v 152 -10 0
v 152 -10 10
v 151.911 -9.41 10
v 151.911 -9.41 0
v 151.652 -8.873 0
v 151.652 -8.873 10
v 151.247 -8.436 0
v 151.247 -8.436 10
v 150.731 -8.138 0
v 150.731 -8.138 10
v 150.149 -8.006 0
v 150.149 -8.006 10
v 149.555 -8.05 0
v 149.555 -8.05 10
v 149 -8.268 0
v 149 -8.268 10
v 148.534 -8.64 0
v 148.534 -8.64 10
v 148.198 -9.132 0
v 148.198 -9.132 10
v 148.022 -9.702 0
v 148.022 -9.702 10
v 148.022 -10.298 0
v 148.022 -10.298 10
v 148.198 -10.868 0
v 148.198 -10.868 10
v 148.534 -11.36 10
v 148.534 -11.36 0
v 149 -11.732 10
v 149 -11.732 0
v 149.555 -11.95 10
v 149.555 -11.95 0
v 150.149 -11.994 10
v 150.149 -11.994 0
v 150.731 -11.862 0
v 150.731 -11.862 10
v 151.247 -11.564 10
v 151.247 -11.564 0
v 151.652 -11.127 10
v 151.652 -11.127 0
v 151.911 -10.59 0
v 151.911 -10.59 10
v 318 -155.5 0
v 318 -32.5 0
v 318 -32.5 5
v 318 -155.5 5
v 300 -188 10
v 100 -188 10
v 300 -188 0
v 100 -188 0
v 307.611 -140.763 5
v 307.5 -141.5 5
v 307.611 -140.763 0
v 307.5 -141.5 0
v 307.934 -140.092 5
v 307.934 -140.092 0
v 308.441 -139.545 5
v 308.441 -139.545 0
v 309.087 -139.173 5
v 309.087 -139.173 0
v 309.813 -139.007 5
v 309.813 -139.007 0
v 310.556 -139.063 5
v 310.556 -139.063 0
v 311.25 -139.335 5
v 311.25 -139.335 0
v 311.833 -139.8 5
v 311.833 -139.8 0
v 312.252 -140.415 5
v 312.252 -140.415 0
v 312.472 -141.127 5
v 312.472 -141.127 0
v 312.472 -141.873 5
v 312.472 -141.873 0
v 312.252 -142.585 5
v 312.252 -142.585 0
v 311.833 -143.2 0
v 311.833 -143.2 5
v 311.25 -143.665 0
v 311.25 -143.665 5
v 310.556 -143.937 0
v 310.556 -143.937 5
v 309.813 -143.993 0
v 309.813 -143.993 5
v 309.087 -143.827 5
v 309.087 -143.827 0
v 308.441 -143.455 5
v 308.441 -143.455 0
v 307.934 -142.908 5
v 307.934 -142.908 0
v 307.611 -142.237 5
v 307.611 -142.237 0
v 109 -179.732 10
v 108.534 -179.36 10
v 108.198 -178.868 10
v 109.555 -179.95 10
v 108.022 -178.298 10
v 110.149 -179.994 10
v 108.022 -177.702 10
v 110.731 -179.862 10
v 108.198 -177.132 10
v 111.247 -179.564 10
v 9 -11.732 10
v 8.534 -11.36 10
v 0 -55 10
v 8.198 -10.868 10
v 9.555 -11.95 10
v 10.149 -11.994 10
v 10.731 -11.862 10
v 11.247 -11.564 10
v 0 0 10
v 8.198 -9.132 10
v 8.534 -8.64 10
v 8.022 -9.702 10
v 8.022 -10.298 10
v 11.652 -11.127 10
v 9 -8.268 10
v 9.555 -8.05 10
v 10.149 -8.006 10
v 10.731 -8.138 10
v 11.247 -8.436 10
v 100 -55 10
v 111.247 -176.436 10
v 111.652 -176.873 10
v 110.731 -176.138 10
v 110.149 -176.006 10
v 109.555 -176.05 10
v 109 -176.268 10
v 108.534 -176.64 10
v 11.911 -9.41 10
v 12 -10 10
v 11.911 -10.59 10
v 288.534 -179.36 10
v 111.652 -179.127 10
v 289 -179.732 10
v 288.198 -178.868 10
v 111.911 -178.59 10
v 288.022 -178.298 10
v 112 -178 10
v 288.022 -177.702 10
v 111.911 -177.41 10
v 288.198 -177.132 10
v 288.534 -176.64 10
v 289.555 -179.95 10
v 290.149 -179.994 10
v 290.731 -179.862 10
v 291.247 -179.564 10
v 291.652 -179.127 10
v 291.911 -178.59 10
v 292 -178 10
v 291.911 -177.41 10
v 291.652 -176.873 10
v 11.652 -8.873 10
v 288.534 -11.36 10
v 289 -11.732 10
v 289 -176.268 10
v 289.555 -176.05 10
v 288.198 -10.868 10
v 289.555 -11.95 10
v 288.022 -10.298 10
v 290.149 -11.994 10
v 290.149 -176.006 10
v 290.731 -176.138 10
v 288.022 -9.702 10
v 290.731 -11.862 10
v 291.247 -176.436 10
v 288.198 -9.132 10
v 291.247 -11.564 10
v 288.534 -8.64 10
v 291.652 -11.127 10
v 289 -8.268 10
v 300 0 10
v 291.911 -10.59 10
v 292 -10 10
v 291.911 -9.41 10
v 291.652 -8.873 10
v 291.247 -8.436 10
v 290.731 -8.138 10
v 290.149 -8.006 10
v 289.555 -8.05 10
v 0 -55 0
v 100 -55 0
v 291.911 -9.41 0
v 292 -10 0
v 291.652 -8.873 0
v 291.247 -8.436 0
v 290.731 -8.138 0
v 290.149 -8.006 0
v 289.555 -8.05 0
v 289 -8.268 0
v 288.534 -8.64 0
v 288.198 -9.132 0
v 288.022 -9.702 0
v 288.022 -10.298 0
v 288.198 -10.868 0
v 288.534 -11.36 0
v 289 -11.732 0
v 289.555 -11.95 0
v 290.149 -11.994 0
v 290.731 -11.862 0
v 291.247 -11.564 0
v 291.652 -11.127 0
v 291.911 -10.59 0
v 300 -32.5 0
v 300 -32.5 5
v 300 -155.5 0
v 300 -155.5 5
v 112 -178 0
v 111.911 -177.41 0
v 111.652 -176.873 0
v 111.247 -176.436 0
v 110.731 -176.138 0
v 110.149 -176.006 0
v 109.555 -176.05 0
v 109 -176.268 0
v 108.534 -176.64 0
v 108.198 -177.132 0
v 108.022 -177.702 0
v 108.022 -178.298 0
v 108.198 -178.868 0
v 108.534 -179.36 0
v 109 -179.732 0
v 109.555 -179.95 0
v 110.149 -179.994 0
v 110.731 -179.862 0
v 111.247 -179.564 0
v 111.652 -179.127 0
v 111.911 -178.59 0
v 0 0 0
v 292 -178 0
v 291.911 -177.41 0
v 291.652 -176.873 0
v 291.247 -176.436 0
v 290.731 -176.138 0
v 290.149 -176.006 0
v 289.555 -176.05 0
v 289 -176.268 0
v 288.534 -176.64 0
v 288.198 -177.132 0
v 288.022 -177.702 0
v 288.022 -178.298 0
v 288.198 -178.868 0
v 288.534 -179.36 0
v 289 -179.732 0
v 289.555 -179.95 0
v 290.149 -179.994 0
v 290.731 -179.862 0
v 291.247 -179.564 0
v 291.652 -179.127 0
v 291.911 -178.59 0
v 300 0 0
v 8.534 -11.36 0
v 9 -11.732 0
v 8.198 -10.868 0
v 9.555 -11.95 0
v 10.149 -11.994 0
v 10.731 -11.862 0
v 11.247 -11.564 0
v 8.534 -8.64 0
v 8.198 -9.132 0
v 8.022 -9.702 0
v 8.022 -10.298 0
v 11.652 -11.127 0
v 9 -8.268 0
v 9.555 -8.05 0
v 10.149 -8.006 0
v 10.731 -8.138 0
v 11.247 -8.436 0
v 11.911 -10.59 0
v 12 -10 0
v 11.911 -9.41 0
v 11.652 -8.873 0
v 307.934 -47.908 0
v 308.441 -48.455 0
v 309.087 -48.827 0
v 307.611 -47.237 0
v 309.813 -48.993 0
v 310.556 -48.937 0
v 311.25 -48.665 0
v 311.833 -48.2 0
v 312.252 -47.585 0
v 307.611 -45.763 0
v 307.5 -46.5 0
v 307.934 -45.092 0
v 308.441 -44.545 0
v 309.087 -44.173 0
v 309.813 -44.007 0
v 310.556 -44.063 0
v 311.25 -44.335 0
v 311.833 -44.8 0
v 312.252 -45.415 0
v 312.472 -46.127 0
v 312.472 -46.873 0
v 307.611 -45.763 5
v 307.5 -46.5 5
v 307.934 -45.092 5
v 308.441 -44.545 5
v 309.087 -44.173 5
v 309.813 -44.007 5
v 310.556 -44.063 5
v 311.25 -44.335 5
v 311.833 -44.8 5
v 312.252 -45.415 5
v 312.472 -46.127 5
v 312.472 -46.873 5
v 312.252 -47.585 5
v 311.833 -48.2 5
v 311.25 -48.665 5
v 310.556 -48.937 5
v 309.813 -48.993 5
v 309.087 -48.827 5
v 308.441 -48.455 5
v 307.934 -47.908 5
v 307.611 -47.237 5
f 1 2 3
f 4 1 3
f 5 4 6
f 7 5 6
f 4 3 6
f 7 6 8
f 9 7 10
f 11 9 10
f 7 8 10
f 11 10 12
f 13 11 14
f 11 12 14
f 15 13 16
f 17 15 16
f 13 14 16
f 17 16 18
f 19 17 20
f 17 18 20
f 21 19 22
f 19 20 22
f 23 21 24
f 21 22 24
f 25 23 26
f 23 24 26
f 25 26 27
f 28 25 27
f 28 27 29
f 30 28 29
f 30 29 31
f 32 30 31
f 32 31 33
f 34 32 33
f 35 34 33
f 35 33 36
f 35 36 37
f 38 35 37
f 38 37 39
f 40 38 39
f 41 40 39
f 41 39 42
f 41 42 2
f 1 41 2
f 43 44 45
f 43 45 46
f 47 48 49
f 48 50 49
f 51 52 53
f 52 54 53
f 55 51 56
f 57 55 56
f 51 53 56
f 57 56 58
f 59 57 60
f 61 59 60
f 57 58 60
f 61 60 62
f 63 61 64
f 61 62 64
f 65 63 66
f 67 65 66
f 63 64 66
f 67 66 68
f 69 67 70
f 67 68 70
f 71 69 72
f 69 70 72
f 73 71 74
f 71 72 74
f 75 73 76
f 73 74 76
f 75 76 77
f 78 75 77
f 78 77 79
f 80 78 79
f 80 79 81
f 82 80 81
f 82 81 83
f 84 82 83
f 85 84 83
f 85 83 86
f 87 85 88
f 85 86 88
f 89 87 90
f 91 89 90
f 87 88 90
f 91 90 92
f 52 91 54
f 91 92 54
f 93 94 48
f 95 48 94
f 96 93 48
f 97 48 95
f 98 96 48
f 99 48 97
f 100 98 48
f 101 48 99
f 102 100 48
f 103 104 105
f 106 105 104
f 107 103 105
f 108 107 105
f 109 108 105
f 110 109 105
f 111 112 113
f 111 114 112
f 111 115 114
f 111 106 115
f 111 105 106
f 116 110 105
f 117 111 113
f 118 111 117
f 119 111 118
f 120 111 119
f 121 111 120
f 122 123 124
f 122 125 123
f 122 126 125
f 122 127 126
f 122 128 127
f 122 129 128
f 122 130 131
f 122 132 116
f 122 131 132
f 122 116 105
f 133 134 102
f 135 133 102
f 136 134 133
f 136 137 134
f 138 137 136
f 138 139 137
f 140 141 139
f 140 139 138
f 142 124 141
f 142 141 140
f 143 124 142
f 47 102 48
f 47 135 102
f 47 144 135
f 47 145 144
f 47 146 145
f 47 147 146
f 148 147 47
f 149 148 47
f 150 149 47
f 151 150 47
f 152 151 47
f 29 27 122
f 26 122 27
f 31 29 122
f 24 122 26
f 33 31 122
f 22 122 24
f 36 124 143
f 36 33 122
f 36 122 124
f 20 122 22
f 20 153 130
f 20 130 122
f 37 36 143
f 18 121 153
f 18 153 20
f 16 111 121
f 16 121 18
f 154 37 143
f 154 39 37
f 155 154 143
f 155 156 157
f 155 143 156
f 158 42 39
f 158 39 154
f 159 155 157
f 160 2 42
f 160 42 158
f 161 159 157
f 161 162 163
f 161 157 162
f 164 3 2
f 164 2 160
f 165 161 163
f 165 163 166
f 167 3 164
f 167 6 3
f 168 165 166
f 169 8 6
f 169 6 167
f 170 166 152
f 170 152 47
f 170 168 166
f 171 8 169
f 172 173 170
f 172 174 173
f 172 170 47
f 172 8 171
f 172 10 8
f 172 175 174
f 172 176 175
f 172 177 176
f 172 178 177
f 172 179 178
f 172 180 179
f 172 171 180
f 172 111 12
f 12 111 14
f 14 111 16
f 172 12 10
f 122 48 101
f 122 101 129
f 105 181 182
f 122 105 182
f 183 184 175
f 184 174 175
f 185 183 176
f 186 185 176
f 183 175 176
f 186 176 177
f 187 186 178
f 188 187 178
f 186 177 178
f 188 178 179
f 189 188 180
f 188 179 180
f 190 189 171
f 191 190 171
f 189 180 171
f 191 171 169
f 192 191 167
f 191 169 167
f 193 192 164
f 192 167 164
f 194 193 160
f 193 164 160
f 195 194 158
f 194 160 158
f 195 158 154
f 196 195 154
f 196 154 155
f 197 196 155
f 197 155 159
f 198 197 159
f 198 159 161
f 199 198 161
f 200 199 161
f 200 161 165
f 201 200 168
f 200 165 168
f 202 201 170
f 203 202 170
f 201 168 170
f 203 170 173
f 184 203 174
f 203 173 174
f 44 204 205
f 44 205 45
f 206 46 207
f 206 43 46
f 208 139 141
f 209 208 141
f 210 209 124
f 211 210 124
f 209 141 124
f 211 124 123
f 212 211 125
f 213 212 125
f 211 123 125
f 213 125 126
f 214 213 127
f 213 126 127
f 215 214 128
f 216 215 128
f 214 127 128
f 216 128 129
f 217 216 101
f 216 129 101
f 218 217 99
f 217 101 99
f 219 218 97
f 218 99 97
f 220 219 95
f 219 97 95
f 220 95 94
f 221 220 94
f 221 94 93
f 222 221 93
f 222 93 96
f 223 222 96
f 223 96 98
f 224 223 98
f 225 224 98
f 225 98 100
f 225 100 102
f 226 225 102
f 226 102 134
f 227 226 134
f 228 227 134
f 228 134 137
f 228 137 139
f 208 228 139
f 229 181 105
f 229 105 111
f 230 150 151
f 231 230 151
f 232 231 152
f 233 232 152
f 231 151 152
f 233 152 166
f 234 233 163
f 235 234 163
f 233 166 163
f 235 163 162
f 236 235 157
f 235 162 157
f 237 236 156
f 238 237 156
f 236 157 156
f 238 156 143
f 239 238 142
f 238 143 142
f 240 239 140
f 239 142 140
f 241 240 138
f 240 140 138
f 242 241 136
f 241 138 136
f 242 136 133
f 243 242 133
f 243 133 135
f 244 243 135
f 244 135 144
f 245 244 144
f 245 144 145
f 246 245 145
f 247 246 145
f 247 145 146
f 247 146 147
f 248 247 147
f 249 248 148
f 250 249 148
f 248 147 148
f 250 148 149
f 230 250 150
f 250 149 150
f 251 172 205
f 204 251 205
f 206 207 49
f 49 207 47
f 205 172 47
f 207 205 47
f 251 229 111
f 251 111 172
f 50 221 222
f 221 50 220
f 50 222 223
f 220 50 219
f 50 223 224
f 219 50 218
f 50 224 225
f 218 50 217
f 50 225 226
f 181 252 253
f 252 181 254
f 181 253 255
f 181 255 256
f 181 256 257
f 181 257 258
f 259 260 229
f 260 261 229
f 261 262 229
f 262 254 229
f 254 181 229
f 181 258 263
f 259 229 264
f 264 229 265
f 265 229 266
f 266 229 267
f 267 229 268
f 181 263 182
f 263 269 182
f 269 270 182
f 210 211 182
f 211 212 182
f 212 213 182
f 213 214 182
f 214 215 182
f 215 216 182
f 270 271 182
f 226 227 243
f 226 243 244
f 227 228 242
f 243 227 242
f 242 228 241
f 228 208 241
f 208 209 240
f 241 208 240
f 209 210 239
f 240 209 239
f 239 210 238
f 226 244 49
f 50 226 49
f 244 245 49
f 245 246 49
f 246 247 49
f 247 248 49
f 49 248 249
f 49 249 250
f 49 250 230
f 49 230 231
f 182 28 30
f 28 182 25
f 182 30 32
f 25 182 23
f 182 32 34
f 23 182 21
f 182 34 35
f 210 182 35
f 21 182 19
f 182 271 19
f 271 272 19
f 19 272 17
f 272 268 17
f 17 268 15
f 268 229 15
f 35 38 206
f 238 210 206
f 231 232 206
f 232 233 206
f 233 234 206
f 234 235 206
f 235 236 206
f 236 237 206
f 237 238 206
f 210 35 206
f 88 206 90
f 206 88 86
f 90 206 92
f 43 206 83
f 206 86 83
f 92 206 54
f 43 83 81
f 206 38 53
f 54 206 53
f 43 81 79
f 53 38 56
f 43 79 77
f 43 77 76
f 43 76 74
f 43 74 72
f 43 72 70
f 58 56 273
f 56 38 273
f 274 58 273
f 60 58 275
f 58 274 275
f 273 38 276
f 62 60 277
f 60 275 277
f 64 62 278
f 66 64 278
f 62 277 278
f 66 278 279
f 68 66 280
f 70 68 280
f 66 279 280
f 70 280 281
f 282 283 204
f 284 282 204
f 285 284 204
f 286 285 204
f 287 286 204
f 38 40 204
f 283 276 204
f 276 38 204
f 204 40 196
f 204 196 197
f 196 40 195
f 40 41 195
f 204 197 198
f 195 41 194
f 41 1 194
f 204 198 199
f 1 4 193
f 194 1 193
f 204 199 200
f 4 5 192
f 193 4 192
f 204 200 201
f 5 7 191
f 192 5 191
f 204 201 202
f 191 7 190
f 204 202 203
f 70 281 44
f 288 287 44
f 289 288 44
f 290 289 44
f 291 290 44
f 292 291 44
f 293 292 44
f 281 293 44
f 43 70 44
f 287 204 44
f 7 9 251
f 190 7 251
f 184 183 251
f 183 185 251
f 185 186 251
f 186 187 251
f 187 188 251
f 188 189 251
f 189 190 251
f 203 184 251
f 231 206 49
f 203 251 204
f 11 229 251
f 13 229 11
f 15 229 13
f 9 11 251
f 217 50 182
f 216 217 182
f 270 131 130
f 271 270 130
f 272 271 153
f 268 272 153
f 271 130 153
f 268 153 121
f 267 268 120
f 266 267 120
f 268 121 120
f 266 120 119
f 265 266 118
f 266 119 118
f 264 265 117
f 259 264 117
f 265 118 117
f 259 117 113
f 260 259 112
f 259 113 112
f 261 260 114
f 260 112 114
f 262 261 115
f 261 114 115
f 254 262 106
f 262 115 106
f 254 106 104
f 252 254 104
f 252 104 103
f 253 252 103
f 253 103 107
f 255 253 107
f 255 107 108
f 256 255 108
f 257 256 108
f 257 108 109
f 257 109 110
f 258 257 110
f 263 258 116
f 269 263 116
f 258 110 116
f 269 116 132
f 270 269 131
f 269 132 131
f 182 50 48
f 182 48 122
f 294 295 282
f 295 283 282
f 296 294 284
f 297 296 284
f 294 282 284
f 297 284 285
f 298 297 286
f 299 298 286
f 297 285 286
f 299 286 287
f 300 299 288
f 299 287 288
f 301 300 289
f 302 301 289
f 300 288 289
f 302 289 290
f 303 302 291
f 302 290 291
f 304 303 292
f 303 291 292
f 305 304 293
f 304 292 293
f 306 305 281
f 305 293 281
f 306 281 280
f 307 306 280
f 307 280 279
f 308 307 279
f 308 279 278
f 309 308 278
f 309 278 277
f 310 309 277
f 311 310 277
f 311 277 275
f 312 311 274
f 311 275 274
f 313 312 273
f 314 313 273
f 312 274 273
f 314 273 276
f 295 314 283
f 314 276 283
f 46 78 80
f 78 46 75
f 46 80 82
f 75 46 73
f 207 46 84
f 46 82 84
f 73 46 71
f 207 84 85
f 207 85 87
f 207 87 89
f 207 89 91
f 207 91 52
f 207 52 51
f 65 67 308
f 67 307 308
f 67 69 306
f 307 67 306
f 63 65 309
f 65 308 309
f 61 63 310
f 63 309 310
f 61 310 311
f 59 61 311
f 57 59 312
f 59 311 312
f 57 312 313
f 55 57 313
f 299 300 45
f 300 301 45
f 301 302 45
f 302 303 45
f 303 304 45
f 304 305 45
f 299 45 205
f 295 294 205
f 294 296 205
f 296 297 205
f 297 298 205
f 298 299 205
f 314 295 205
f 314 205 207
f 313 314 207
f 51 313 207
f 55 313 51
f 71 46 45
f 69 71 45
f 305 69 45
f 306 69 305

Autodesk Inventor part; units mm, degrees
ref_plane "YZ Plane" through (0, 0, 0) normal (1, 0, 0) x (0, 1, 0)
ref_plane "XZ Plane" through (0, 0, 0) normal (0, 1, 0) x (-1, 0, 0)
ref_plane "XY Plane" through (0, 0, 0) normal (0, 0, 1) x (1, 0, 0)
sketch "Sketch1" plane through (0, 0, 0) normal (0, 0, 1) x (1, 0, 0)
  line L0 (0, 0) -> (600, 0)
  line L1 (100, -188) -> (500, -188)
  line L2 (500, -188) -> (500, -55)
  line L3 (500, -55) -> (600, -55)
  line L4 (600, -55) -> (600, 0)
  line L5 (100, -188) -> (100, -55)
  line L6 (0, -55) -> (0, 0)
  line L7 (0, -55) -> (100, -55)
  point P0 (300, -188)
  point P1 (300, 0)
  dimension "d0" = 600
  dimension "d1" = 188
  dimension "d2" = 400
  dimension "d3" = 133
extrude "Extrusion1" add sketch "Sketch1" along normal blind 10
sketch "Sketch2" plane through (0, 0, 10) normal (0, 0, 1) x (1, 0, 0)
  line L0 (600, 0) -> (0, 0) projected
  line L1 (500, -188) -> (100, -188) projected
  line L2 (600, 0) -> (300, 0)
  line L3 (300, 0) -> (300, -188)
  line L4 (300, -188) -> (600, -188)
  line L5 (600, -188) -> (600, 0)
extrude "Extrusion2" cut sketch "Sketch2" against normal through all
sketch "Sketch3" plane through (0, 0, 10) normal (0, 0, 1) x (1, 0, 0)
  circle A0 centre (10, -10) radius 2
  line L0 (300, 0) -> (0, 0) projected
  line L1 (0, 0) -> (0, -55) projected
  circle A1 centre (150, -10) radius 2
  circle A2 centre (290, -10) radius 2
  line L2 (300, -188) -> (300, 0) projected
  line L3 (10, -10) -> (290, -10) construction
  circle A3 centre (110, -178) radius 2
  line L4 (100, -55) -> (100, -188) projected
  line L5 (100, -188) -> (300, -188) projected
  circle A4 centre (290, -178) radius 2
  dimension "d8" = 4
  dimension "d9" = 10
  dimension "d10" = 10
  dimension "d11" = 4
  dimension "d12" = 4
  dimension "d13" = 10
  dimension "d14" = 4
  dimension "d15" = 10
  dimension "d16" = 10
  dimension "d17" = 4
  dimension "d18" = 10
  dimension "d19" = 10
extrude "Extrusion3" cut sketch "Sketch3" against normal through all
sketch "Sketch4" plane through (0, 0, 0) normal (0, 0, -1) x (-1, 0, 0)
  line L0 (-300, 0) -> (-300, -188) projected
  line L1 (-300, -32.5) -> (-318, -32.5)
  line L2 (-318, -32.5) -> (-318, -155.5)
  line L3 (-318, -155.5) -> (-300, -155.5)
  line L4 (-300, -155.5) -> (-300, -32.5)
  circle A0 centre (-310, -46.5) radius 2.5
  circle A1 centre (-310, -141.5) radius 2.5
  line L5 (-310, -46.5) -> (-310, -141.5) construction
  point P0 (0, 0)
  point P1 (-300, -94)
  point P2 (-310, -94)
  dimension "d22" = 18
  dimension "d23" = 123
  dimension "d24" = 5
  dimension "d25" = 5
  dimension "d26" = 10
  dimension "d27" = 95
extrude "Extrusion4" add sketch "Sketch4" against normal blind 5
properties part number "SP001b" material "ABS Plastic"
